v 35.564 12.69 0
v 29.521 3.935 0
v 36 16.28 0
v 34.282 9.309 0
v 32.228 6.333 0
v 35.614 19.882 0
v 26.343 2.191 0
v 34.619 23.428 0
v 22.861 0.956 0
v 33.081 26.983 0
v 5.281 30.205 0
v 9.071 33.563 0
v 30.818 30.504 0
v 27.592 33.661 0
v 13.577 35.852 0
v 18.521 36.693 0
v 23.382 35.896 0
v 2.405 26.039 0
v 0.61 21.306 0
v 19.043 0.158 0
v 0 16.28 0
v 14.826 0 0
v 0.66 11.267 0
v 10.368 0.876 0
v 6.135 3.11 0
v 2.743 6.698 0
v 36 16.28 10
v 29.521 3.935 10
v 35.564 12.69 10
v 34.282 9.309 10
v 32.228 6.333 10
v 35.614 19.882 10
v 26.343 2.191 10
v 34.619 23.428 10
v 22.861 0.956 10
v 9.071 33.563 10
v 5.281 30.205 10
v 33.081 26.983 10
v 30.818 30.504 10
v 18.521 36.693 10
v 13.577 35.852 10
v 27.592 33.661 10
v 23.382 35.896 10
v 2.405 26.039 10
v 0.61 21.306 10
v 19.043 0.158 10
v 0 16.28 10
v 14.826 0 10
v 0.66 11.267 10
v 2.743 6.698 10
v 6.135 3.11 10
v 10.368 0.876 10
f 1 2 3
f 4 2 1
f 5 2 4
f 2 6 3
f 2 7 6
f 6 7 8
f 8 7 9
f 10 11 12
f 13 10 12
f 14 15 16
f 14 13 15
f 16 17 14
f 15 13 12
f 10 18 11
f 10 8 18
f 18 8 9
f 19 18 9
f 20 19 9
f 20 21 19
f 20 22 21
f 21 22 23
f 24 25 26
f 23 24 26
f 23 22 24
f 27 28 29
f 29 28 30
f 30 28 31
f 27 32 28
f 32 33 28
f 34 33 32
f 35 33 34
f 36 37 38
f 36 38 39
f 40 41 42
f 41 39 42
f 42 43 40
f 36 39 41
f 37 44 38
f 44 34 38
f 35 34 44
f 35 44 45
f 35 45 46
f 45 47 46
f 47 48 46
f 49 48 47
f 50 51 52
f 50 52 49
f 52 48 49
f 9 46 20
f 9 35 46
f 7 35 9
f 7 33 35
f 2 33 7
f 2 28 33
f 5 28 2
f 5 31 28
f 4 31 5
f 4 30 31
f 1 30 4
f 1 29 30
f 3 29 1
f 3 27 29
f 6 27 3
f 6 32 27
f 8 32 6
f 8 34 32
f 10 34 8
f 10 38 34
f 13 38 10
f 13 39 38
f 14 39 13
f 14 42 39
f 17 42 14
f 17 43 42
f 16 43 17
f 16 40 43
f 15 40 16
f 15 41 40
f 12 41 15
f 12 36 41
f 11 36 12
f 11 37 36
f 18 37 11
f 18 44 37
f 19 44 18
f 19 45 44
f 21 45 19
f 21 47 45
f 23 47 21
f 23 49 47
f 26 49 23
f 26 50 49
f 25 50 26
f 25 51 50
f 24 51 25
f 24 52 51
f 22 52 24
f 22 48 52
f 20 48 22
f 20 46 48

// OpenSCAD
$fn = 32;

// ----------------------------------------------------------------------
// Cam disc: base radius 15.0 mm, lift 6.0 mm, 26 profile points
// ----------------------------------------------------------------------

// --- parameters (mm) ---
profile_height = 10;      // extrusion height
profile_points = 26;      // points of the closed outline

profile = [[36, 16.28], [35.614, 19.882], [34.619, 23.428], [33.081, 26.983], [30.818, 30.504], [27.592, 33.661], [23.382, 35.896], [18.521, 36.693], [13.577, 35.852], [9.071, 33.563], [5.281, 30.205], [2.405, 26.039], [0.61, 21.306], [0, 16.28], [0.66, 11.267], [2.743, 6.698], [6.135, 3.11], [10.368, 0.876], [14.826, 0], [19.043, 0.158], [22.861, 0.956], [26.343, 2.191], [29.521, 3.935], [32.228, 6.333], [34.282, 9.309], [35.564, 12.69]];  // single closed polygon, 26 points, counter clockwise

// --- the one profile operation ---
linear_extrude(height = profile_height) polygon(points = profile);
